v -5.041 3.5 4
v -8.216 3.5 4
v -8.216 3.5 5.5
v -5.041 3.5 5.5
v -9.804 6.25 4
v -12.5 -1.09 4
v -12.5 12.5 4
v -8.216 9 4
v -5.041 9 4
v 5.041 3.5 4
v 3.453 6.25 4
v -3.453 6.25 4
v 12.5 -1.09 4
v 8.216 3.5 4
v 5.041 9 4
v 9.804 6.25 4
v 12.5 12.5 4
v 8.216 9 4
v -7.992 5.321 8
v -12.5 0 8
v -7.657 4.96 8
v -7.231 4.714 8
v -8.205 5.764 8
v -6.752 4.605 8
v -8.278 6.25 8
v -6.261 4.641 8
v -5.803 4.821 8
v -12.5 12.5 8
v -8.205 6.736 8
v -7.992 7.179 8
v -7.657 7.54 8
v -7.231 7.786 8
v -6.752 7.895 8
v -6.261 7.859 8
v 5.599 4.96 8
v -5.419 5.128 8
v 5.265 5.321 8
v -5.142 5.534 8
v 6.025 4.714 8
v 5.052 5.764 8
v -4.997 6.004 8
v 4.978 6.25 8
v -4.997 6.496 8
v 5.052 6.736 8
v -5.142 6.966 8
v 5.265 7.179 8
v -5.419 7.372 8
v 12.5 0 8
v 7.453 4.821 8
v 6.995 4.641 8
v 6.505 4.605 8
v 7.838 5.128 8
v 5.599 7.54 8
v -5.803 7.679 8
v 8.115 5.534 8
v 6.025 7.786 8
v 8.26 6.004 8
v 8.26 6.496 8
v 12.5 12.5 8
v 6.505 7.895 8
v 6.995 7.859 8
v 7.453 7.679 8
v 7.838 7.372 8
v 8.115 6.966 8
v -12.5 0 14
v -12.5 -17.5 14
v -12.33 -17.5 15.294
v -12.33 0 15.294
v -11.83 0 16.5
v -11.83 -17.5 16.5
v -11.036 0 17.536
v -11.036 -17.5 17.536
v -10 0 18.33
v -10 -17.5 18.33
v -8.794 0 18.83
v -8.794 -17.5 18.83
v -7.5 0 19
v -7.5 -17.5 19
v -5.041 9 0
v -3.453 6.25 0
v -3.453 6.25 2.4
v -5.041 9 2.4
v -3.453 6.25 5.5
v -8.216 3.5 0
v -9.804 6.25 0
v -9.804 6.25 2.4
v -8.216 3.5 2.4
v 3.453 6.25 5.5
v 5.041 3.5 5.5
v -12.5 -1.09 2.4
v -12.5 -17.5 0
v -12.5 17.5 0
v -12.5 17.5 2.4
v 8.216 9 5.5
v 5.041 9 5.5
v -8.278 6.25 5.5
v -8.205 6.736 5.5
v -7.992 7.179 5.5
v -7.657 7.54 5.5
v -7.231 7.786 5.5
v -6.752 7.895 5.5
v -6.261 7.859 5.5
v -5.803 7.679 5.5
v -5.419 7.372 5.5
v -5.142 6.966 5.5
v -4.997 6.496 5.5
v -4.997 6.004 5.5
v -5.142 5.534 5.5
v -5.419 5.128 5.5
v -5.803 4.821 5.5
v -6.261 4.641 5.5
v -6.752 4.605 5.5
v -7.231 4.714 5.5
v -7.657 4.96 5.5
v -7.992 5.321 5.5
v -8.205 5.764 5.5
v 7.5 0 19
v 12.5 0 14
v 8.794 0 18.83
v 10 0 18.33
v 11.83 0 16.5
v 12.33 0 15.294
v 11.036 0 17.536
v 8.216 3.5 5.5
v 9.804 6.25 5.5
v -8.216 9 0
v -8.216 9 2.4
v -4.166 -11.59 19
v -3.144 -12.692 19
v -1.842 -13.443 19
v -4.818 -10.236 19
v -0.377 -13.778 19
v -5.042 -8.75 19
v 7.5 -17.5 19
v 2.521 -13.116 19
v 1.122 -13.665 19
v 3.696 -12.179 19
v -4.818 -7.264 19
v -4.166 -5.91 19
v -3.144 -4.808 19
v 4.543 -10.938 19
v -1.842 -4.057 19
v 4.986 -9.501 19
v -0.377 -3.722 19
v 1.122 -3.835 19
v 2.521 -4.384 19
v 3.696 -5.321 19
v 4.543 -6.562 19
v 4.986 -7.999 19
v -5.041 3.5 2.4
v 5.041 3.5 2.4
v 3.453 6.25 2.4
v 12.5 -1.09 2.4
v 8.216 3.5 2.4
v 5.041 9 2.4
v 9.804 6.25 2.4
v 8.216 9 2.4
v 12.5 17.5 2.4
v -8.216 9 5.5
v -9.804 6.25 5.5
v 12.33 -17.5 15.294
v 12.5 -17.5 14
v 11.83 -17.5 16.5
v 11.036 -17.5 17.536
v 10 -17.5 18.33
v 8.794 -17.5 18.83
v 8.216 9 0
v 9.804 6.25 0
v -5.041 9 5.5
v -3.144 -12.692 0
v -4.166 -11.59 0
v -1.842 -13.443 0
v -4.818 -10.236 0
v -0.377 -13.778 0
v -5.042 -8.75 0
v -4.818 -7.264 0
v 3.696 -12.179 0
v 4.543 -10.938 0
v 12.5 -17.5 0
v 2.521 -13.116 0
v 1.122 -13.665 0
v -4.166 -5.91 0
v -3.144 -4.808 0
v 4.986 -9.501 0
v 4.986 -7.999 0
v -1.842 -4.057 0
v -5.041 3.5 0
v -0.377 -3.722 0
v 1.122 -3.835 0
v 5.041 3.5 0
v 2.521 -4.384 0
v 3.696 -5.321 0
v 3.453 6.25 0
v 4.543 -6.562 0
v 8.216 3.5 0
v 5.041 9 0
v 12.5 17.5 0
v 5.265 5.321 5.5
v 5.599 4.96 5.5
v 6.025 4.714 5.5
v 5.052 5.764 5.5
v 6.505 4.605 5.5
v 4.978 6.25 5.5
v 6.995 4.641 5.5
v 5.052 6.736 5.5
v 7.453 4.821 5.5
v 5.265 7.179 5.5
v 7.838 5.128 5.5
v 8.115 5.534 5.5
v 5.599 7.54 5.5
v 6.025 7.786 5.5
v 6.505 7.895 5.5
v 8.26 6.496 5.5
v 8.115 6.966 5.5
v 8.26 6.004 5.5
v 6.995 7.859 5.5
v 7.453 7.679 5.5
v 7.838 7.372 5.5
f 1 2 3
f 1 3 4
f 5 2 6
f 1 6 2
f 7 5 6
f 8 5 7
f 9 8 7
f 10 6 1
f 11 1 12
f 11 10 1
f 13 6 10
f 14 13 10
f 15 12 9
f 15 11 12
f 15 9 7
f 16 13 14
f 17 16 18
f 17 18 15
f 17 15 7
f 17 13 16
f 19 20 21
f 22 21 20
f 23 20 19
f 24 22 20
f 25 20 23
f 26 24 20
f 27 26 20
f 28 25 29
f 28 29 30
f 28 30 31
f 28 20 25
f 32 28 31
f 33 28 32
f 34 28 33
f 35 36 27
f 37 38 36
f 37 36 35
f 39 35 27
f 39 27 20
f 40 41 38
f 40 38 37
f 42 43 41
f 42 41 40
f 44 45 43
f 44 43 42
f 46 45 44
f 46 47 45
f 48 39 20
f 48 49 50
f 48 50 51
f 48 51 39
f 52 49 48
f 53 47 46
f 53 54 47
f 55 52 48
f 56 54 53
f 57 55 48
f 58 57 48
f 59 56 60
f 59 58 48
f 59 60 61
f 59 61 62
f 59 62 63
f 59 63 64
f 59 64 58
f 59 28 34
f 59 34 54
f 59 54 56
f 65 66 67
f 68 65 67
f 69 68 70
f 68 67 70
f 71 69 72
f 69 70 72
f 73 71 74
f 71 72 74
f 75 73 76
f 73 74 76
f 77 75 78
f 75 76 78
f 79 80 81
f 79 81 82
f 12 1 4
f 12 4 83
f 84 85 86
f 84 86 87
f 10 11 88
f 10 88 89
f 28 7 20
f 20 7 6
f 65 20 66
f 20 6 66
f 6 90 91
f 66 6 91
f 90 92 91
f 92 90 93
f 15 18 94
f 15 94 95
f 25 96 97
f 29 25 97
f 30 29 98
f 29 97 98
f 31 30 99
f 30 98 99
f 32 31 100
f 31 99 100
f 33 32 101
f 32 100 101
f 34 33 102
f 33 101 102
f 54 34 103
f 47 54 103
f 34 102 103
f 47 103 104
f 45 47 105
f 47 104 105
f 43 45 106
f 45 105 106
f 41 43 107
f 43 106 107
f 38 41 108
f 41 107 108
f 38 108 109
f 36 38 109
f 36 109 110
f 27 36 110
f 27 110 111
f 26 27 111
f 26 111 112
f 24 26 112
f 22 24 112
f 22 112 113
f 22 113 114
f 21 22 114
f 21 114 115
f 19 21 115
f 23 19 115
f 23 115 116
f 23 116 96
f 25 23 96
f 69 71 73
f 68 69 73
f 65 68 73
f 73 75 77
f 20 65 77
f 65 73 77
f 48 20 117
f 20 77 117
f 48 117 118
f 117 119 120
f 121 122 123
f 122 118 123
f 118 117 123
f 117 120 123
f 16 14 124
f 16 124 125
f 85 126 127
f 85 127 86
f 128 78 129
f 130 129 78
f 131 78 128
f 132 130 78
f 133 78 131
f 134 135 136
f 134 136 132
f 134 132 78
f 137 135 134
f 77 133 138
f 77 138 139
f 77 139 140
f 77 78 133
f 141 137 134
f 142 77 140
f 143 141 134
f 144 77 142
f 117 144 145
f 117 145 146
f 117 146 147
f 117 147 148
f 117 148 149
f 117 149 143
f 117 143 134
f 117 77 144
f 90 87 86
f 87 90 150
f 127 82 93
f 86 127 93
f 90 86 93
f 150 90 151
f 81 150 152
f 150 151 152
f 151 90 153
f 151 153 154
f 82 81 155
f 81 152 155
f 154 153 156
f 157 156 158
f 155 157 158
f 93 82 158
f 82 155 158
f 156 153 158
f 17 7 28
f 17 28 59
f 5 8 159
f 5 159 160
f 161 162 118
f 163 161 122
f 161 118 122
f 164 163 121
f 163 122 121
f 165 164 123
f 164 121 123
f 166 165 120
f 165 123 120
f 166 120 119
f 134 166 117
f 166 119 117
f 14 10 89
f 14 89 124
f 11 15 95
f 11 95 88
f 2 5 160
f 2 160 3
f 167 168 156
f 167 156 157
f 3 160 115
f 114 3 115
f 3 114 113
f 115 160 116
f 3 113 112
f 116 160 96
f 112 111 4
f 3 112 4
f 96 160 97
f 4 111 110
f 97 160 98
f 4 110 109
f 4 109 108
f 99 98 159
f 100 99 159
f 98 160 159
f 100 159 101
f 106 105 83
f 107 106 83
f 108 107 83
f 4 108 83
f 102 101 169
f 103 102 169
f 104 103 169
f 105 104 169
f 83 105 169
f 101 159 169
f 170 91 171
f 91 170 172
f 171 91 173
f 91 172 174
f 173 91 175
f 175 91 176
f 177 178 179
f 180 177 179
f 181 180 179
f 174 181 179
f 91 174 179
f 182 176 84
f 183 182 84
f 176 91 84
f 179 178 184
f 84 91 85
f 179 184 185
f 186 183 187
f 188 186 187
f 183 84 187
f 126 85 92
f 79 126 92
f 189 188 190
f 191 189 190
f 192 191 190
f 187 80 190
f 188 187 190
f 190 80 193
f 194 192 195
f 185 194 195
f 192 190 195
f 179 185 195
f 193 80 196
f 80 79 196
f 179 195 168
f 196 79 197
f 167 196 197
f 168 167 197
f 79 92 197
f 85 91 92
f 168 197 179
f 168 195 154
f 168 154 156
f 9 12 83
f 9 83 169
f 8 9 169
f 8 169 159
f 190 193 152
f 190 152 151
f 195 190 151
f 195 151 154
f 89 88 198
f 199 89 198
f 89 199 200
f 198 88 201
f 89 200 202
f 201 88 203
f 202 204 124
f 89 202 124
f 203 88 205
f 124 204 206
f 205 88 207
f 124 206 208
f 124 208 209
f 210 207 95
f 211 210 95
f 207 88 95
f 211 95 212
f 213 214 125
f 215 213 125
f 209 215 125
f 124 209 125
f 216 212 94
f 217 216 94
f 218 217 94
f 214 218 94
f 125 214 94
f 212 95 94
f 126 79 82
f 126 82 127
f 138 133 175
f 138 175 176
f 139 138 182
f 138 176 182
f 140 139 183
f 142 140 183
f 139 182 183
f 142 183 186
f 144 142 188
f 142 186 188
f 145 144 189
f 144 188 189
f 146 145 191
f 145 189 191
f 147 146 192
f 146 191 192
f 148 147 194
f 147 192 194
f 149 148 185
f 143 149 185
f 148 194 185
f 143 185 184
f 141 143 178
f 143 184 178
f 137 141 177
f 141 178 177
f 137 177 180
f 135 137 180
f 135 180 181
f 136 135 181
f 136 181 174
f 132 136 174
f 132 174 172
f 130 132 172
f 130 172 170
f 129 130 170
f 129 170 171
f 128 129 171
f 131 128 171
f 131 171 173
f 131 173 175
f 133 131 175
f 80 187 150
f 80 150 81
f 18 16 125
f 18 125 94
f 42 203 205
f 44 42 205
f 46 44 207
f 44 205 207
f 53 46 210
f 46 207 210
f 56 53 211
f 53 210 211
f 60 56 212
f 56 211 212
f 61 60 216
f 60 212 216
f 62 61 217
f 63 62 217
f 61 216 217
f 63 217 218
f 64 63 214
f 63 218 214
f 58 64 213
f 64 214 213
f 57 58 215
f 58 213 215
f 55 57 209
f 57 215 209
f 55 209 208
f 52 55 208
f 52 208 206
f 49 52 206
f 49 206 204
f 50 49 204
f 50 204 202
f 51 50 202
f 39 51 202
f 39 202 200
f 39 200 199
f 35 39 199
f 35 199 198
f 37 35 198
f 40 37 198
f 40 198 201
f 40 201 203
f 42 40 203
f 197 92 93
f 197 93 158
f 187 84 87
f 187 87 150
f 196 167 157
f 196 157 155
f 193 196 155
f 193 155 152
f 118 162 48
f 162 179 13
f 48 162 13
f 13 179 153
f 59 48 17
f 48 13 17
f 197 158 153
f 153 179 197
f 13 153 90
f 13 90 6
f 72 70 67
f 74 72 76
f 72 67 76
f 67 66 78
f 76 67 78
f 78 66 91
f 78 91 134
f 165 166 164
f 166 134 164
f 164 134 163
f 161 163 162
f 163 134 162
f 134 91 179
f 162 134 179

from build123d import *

# Parameters (mm, degrees)
F0_W      = 25
F0_H      = 35
F1_DEPTH  = 4
F2_W      = 25
F2_H      = 25
F2_H_2    = 5
F3_DEPTH  = 15
F4_R      = 5
F5_W      = 15
F5_H      = 12.5
F6_DEPTH  = 11
F9_D      = 3.3
F11_DEPTH = 5.5
F7_W      = 20
F7_H      = 1.6
F12_DEPTH = 25
F14_D     = 10.0838


# Not quite as in the source:
# - a feature names something its author has since deleted; it is built from what else it names


with BuildPart() as f1:
    # F0 (on Top) → F1 (new body)
    with BuildSketch(Plane.XY):
        Rectangle(F0_W, F0_H)
    extrude(amount=F1_DEPTH)

    # F2 (on face) → F3 (join)
    with BuildSketch(Plane.XY.offset(4)):
        Rectangle(F2_W, F2_H)
        with Locations((0, -15)):
            Rectangle(F2_W, F2_H_2)
    extrude(amount=F3_DEPTH)

    # F4
    f4_edges = [f1.edges().sort_by_distance(p)[0] for p in [
        (-12.5, -2.5, 19),
        (12.5, -2.5, 19),
    ]]
    fillet(f4_edges, radius=F4_R)

    # F5 (on face) → F6 (cut)
    with BuildSketch(Plane.XY.offset(19)):
        Polygon((-16.3788758218, 17.6315885037), (-16.3788758218, 0), (-7.5, 0), (-7.5, 12.5), (7.5, 12.5), (7.5, 0), (18.287928775, 0), (18.287928775, 17.6315885037), align=None)
        with Locations((0, 6.25)):
            Rectangle(F5_W, F5_H)
    extrude(amount=-F6_DEPTH, mode=Mode.SUBTRACT)

    # F9 (through all)
    with Locations(Plane.XY.offset(8)):
        with Locations((6.6282246262, 6.25), (-6.6282246262, 6.25)):
            Hole(F9_D / 2)

    # F10 (on face) → F11 (cut)
    with BuildSketch(Plane.XY):
        Polygon((-5.0405113859, 3.5), (-3.4527981456, 6.25), (-5.0405113859, 9), (-8.2159378665, 9), (-9.8036511067, 6.25), (-8.2159378665, 3.5), align=None)
        Polygon((5.0405113859, 9), (3.4527981456, 6.25), (5.0405113859, 3.5), (8.2159378665, 3.5), (9.8036511067, 6.25), (8.2159378665, 9), align=None)
    extrude(amount=F11_DEPTH, mode=Mode.SUBTRACT)

    # F7 (on face) → F12 (cut)
    with BuildSketch(Plane.YZ.offset(12.5)):
        with Locations((8.9099199928, 3.2)):
            Rectangle(F7_W, F7_H)
    extrude(amount=-F12_DEPTH, mode=Mode.SUBTRACT)

    # F14 (through all)
    with Locations(Plane.XY.offset(19)):
        with Locations((0, -8.75)):
            Hole(F14_D / 2)


solid = f1.part
